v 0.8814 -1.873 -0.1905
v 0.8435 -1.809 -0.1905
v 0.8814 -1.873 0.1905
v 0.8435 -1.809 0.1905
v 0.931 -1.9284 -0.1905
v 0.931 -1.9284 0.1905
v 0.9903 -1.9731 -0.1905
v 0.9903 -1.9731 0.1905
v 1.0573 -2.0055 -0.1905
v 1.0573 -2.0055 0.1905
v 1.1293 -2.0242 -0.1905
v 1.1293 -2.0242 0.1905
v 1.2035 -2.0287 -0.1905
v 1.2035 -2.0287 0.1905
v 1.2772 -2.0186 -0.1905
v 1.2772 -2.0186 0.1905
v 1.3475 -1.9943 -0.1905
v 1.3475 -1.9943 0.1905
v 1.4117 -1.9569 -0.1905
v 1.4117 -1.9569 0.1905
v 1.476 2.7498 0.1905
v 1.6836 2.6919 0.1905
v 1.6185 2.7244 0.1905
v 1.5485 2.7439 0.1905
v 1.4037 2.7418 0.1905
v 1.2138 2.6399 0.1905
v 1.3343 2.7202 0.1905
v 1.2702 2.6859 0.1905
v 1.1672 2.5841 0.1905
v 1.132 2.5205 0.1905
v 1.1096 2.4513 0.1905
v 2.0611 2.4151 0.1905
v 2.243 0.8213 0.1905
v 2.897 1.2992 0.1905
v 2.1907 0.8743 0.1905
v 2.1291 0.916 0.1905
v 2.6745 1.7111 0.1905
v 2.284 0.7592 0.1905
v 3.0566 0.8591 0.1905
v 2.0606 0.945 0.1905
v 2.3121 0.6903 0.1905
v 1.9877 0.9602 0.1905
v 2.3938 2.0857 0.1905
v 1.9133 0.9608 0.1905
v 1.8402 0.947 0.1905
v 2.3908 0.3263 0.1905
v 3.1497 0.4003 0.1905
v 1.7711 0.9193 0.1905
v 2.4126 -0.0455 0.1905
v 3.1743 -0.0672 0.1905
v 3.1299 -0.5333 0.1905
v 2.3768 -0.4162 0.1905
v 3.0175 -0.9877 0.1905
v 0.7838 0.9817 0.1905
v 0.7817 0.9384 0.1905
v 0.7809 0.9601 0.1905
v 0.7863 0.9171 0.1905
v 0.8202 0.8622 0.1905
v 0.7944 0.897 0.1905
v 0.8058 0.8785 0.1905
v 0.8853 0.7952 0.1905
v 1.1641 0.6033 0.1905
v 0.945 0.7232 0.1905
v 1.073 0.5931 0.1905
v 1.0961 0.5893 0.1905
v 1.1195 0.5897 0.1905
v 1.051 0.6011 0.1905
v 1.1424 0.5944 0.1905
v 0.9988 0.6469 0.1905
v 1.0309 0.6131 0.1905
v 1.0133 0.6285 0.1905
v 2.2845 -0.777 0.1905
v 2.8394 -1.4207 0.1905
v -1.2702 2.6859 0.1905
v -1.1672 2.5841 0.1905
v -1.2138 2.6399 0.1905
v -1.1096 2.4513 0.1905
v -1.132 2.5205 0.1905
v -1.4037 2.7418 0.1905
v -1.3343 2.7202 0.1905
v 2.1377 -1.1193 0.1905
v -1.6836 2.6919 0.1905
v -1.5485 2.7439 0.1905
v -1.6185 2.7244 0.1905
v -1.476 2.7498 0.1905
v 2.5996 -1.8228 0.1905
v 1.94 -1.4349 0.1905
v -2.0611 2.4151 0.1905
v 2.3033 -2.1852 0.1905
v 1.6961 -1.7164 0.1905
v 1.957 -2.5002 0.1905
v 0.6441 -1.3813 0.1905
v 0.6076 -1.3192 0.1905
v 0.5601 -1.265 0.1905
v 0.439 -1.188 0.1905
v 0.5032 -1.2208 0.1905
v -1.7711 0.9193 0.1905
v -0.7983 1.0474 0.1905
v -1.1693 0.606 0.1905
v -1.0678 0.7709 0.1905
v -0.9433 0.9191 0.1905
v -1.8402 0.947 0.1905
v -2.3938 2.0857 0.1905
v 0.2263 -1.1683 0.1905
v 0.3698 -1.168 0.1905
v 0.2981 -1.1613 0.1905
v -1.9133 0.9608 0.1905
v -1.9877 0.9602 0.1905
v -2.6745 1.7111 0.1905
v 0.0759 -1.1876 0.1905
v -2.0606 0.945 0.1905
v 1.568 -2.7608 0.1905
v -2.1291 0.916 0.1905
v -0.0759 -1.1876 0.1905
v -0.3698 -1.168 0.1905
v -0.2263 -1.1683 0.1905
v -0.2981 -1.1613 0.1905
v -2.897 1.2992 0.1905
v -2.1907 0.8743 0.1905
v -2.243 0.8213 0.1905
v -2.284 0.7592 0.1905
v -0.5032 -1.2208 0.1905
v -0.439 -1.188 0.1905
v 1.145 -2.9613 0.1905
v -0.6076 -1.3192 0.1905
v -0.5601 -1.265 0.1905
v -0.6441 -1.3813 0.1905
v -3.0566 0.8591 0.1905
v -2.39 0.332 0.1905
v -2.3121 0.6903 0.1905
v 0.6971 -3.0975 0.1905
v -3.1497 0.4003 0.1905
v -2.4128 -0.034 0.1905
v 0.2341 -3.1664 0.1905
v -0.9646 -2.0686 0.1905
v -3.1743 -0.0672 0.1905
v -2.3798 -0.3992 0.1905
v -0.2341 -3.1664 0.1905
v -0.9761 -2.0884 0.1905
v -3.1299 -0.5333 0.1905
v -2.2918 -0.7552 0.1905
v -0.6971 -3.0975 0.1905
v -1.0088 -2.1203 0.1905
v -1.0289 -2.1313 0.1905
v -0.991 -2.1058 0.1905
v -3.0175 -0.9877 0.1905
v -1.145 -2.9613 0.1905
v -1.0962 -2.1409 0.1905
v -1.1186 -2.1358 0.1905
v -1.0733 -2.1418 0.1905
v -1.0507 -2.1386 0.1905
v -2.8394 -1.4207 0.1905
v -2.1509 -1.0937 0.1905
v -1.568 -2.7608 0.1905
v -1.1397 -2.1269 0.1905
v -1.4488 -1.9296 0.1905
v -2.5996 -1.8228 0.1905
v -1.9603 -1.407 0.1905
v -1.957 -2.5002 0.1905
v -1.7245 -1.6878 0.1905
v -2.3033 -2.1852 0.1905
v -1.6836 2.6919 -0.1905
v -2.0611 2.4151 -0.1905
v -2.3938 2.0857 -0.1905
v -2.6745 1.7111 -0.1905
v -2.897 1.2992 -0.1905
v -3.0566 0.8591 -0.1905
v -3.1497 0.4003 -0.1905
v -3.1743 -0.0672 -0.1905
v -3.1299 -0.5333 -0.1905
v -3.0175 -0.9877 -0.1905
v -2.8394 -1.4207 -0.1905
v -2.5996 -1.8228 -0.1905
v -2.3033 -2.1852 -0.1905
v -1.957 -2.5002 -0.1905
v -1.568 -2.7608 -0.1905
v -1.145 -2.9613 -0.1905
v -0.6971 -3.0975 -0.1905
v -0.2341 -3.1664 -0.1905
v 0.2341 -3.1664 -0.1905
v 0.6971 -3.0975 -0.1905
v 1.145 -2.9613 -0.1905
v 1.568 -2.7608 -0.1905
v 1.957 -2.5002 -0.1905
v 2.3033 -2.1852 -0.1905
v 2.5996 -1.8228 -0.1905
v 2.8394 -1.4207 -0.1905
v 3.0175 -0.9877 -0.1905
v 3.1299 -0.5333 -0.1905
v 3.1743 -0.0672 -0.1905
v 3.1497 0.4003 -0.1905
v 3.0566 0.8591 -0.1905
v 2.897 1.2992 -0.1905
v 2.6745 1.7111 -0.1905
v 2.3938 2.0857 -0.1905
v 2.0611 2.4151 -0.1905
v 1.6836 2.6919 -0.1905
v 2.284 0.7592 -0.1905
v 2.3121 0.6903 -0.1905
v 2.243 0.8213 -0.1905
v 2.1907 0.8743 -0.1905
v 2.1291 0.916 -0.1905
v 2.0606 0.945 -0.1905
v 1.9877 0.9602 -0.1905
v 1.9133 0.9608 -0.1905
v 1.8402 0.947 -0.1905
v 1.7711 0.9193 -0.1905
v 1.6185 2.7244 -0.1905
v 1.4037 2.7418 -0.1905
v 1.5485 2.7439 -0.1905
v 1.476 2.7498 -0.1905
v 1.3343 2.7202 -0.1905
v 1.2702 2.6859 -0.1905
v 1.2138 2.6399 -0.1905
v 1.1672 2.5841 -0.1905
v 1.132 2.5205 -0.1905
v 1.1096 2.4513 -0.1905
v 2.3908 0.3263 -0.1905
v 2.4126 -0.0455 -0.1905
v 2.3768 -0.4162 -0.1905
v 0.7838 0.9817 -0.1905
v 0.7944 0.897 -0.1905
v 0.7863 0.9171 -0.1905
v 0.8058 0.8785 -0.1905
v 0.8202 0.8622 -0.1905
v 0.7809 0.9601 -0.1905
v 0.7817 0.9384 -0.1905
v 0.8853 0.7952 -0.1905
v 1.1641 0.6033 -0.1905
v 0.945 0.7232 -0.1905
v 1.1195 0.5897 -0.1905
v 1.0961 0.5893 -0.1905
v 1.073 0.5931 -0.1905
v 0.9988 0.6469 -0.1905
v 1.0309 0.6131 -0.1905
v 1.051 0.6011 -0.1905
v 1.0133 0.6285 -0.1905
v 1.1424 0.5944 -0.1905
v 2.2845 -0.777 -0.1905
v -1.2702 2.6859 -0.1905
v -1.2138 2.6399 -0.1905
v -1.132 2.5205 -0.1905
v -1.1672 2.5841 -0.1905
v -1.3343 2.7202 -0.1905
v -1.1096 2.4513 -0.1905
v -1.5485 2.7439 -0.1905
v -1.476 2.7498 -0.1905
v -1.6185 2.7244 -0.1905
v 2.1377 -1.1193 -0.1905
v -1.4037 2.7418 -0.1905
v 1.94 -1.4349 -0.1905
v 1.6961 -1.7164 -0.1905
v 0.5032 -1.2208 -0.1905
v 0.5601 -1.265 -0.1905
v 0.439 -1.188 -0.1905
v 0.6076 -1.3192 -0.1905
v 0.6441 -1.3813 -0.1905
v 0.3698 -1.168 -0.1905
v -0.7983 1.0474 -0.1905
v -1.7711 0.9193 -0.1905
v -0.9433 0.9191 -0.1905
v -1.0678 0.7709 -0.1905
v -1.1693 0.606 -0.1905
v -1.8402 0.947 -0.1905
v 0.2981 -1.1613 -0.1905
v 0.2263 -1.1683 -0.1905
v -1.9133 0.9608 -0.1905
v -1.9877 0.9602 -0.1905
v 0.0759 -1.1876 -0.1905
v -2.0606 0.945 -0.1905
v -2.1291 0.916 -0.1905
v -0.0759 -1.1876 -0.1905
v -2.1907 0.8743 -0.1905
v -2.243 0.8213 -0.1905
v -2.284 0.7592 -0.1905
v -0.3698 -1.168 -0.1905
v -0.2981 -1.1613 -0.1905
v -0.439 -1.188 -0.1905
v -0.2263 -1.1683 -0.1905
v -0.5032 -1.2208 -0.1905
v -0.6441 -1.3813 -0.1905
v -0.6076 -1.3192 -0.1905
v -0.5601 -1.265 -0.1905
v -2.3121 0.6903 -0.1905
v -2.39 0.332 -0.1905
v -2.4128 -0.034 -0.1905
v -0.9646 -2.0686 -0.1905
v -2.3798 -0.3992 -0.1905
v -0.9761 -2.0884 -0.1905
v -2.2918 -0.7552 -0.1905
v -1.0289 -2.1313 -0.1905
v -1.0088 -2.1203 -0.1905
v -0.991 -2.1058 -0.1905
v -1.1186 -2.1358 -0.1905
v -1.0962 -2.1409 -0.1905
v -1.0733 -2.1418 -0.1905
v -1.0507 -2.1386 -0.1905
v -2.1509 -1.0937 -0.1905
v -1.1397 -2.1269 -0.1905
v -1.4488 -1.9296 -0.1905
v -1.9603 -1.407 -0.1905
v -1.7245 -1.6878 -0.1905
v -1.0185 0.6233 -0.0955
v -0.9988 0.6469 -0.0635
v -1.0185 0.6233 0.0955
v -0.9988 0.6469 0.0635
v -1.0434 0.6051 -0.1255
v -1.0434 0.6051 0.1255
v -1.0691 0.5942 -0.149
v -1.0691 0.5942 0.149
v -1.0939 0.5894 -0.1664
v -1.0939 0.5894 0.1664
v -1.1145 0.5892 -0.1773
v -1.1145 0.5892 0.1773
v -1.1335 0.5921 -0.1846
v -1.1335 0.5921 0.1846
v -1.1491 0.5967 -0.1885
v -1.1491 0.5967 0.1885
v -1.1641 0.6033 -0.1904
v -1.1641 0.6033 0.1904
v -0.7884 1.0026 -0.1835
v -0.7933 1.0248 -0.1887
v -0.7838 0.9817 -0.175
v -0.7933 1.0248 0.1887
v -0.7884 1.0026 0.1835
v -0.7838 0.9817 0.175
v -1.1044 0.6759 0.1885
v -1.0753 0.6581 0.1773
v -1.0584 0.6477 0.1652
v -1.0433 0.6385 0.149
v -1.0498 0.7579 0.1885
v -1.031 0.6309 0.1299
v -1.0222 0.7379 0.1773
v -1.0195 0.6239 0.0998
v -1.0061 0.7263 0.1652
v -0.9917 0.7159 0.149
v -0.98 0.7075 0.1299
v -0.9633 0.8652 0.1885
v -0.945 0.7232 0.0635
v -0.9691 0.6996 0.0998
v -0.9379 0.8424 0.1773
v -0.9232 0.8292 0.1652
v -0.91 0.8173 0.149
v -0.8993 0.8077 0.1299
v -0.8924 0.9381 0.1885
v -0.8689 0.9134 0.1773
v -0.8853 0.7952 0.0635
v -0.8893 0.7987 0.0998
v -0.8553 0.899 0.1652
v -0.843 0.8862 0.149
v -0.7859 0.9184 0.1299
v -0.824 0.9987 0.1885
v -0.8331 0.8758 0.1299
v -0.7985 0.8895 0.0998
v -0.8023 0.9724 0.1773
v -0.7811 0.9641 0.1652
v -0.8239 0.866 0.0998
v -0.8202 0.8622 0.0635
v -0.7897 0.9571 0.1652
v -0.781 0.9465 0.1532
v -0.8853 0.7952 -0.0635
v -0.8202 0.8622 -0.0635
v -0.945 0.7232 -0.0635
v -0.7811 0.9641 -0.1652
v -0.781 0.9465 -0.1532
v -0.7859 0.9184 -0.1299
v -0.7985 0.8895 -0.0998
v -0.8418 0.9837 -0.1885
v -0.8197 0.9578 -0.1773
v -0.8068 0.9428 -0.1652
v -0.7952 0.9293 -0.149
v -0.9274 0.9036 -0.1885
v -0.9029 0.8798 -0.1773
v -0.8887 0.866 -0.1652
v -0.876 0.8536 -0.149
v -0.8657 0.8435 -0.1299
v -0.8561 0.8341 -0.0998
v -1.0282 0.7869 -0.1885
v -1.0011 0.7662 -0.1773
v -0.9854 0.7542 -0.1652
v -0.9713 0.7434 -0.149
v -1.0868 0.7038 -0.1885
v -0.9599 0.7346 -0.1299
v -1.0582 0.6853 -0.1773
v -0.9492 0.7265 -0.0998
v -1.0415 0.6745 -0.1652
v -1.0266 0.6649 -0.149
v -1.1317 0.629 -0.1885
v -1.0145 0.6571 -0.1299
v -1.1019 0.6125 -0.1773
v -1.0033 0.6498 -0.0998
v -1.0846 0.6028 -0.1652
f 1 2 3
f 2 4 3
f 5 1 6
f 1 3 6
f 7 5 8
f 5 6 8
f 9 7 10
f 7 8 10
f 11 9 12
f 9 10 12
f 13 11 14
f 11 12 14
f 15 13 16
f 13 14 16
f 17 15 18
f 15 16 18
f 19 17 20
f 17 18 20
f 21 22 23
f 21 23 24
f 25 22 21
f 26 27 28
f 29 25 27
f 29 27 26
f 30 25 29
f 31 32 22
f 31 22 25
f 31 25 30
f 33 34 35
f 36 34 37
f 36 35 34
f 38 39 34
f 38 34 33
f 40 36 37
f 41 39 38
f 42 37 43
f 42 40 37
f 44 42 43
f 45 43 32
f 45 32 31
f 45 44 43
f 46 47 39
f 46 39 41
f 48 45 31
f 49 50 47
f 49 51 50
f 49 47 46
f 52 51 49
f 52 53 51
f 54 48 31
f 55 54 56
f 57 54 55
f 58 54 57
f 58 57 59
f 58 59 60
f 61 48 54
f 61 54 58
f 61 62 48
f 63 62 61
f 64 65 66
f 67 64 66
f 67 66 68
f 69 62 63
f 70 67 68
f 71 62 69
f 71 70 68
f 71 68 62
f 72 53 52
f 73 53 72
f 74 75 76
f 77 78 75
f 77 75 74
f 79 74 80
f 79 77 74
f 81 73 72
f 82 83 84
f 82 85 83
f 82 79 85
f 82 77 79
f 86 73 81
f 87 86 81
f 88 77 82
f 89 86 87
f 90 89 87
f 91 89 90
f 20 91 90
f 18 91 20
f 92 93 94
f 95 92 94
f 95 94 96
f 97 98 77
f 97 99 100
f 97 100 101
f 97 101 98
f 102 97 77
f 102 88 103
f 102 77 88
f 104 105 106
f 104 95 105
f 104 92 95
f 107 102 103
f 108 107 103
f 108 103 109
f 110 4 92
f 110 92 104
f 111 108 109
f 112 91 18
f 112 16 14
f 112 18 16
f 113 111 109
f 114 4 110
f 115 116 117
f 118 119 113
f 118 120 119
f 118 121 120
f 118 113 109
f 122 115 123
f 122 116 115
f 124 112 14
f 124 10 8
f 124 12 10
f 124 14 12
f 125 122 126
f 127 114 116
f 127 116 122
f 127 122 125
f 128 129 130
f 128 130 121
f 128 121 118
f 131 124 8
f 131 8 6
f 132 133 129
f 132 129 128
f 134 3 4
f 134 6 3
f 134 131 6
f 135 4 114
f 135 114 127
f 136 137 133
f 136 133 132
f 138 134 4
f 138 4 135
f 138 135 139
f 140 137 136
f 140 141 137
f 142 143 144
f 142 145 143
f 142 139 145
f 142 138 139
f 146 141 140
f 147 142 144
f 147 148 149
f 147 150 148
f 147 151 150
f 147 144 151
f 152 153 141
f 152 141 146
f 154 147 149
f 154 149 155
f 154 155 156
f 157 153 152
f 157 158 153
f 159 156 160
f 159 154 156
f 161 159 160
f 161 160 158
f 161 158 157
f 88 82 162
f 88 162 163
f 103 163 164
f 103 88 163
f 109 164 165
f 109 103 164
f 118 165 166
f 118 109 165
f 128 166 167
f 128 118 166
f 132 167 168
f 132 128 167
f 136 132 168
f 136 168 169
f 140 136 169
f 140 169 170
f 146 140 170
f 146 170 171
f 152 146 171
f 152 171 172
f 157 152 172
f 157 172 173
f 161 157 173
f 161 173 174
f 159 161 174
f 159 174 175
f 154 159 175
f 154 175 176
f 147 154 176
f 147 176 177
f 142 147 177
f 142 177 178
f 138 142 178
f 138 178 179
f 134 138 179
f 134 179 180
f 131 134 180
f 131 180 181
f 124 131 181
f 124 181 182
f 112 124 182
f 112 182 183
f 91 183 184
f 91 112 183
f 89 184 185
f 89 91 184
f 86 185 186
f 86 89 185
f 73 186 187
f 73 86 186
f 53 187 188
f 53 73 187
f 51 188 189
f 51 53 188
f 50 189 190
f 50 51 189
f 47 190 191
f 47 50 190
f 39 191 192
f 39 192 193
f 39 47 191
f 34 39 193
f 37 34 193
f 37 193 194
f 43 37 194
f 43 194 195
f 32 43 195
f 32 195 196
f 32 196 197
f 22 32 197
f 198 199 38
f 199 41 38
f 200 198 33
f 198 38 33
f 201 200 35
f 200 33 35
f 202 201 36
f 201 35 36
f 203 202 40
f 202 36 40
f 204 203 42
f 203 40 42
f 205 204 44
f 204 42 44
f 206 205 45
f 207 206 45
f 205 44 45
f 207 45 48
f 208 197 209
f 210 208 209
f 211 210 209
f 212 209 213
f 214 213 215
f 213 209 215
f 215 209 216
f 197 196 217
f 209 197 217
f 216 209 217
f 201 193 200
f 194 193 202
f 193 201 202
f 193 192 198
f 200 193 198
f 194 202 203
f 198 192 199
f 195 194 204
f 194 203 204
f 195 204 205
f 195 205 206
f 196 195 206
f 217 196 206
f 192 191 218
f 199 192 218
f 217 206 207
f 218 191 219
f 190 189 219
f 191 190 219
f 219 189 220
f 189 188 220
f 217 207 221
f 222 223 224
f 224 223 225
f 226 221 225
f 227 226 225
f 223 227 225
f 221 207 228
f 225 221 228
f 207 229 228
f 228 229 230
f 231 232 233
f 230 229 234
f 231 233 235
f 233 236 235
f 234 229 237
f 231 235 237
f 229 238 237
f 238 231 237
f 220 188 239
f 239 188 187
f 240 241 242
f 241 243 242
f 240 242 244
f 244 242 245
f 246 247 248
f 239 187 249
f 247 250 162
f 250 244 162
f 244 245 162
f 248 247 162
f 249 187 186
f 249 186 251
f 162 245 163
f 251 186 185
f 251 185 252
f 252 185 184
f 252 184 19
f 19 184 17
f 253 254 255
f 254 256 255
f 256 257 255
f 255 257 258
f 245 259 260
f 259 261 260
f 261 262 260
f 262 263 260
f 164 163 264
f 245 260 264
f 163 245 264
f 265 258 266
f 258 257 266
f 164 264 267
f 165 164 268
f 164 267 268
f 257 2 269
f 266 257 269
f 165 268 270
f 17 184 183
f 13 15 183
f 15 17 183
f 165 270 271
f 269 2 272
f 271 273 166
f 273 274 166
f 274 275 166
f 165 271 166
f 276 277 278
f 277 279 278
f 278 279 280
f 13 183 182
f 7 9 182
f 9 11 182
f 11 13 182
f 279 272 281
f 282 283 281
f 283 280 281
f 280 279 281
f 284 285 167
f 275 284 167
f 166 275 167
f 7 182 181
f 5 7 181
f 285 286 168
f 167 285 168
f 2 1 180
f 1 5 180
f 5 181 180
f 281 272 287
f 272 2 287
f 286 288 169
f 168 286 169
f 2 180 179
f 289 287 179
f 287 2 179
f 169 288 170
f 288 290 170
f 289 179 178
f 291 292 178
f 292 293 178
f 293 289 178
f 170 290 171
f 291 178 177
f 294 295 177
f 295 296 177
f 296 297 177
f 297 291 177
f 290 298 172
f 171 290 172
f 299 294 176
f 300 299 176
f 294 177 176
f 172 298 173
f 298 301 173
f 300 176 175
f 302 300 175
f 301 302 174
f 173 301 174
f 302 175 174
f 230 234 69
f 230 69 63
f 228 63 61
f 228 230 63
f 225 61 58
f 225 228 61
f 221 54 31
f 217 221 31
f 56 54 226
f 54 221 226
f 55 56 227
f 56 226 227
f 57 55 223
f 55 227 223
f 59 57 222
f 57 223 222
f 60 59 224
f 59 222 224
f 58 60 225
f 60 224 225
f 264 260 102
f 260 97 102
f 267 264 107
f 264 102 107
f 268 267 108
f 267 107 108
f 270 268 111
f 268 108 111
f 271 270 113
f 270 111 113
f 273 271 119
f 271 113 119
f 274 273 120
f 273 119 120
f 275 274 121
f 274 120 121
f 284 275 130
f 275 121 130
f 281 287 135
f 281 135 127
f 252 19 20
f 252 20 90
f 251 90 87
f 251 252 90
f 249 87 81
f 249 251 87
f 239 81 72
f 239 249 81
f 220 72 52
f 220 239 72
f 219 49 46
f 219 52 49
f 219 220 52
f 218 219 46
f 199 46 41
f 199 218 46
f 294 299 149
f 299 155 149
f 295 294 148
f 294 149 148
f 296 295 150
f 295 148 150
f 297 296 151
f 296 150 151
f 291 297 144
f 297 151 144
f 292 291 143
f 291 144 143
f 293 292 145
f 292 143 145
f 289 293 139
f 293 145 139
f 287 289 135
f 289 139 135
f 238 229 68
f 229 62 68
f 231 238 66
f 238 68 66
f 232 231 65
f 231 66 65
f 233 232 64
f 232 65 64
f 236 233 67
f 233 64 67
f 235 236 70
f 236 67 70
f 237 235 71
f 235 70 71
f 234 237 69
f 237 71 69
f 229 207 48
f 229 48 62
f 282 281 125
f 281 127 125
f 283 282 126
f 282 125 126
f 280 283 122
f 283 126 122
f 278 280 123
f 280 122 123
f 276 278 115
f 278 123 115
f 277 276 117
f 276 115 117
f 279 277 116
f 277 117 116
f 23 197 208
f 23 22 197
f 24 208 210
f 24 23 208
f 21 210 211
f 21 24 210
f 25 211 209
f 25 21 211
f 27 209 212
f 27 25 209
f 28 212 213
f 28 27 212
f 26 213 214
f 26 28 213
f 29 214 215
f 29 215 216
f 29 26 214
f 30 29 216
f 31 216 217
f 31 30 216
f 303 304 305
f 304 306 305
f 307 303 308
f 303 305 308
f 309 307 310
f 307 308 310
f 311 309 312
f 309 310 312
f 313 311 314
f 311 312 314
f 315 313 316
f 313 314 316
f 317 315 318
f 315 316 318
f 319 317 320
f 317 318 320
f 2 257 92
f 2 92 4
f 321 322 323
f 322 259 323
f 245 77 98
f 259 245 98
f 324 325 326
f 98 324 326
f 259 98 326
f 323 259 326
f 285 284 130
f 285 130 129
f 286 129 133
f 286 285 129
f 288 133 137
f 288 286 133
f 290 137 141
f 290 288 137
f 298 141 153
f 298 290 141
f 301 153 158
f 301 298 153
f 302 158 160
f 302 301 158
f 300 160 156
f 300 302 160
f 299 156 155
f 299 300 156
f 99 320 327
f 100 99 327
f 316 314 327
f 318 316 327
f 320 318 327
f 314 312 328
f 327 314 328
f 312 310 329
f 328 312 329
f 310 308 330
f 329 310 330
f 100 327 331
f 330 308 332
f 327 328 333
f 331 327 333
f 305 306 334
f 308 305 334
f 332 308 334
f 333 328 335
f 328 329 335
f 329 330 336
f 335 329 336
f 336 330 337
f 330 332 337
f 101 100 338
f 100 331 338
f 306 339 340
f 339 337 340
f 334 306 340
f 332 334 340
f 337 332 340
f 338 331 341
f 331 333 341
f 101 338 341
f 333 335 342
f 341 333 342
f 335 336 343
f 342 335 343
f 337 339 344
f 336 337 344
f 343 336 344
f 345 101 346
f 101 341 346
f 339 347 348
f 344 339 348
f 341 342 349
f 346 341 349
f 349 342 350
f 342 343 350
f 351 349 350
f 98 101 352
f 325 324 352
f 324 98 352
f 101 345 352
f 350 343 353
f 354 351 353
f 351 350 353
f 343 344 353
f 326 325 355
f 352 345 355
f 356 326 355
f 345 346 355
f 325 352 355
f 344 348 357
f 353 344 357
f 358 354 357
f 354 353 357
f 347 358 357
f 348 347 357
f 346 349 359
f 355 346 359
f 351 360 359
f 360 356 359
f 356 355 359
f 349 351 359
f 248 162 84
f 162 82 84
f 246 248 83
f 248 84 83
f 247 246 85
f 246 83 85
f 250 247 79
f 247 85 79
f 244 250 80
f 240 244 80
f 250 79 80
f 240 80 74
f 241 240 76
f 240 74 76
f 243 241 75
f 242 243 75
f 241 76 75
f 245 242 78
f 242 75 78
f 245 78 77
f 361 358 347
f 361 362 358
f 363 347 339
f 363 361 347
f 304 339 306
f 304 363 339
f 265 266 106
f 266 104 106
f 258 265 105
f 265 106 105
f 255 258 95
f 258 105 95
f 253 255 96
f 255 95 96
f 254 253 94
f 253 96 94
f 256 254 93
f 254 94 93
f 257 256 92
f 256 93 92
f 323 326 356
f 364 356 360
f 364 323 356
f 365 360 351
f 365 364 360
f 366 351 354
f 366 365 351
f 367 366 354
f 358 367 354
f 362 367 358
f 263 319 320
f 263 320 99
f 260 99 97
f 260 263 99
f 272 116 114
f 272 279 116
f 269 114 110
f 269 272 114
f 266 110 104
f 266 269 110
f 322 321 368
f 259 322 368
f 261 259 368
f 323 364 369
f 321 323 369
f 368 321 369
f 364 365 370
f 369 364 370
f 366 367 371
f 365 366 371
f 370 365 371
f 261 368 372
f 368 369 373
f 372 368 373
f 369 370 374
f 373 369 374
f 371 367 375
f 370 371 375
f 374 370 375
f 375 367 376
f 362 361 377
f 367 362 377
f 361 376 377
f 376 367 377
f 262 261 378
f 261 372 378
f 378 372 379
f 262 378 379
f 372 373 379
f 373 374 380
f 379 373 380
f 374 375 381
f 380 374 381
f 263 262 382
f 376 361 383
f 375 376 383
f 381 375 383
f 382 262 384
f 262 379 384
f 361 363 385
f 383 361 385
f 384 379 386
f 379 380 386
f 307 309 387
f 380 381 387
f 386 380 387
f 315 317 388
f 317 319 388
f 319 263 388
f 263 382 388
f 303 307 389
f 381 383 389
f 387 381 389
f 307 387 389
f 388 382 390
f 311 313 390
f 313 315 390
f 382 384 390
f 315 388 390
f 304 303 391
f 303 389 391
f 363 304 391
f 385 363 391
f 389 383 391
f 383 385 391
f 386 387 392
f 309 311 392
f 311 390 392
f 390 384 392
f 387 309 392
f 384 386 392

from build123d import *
from OCP.BRepFilletAPI import BRepFilletAPI_MakeFillet

# Parameters (mm, degrees)
SKETCH1_R               = 3.175
SKETCH1_R_2             = 1.18999
BOSS_EXTRUDE1_DEPTH     = 0.1905
CUT_EXTRUDE1_DEPTH      = 5.50626353
CUT_EXTRUDE2_DEPTH      = 5.50626353
CUT_EXTRUDE2_DEPTH_BACK = 5.50626353
FILLET1_R1              = 0.127
FILLET1_R2              = 0.381


with BuildPart() as part:
    # Sketch1 → Boss-Extrude1 (new, symmetric)
    with BuildSketch(Plane.XY):
        with Locations(Location((0, 0, 0), (0, 0, 180))):
            Circle(SKETCH1_R)
        with Locations(Location((0, 0, 0), (0, 0, 180))):
            Circle(SKETCH1_R_2, mode=Mode.SUBTRACT)
    extrude(amount=BOSS_EXTRUDE1_DEPTH, both=True)

    # Sketch2 → Cut-Extrude1 (cut, through all)
    with BuildSketch(Plane.XY.offset(0.1905)):
        Polygon((-0.635, 0.3107001), (0.635, 0.3107001), (1.27, 3.175), (-1.27, 3.175), align=None)
    extrude(amount=-CUT_EXTRUDE1_DEPTH, mode=Mode.SUBTRACT)

    # Sketch3 → Cut-Extrude2 (cut, two sides: drawn at the far end of the back side and taken through both)
    with BuildSketch(Plane.XY.offset(0.1905).offset(-CUT_EXTRUDE2_DEPTH_BACK)):
        with BuildLine():
            Line((-1.05664, 0.547346426), (-2.141464207, 1.112070164))
            ThreePointArc((-2.141464207, 1.112070164), (-2.284557926, -0.77676514), (-1.01978636, -2.186916729))
            Line((-1.01978636, -2.186916729), (-0.50292, -1.078493242))
            ThreePointArc((-0.50292, -1.078493242), (-1.12645262, -0.383641362), (-1.05664, 0.547346426))
        make_face()
        with BuildLine():
            Line((0.50292, -1.078493242), (1.01978636, -2.186916729))
            ThreePointArc((1.01978636, -2.186916729), (2.284557926, -0.77676514), (2.141464207, 1.112070164))
            Line((2.141464207, 1.112070164), (1.05664, 0.547346426))
            ThreePointArc((1.05664, 0.547346426), (1.12645262, -0.383641362), (0.50292, -1.078493242))
        make_face()
    extrude(amount=CUT_EXTRUDE2_DEPTH + CUT_EXTRUDE2_DEPTH_BACK, mode=Mode.SUBTRACT)

    # Fillet1: one fillet with a radius per group of edges: ONE call of the kernel's fillet builder (fillet() takes one radius for all edges)
    fillet1_edges_1 = [part.edges().sort_by_distance(p)[0] for p in [
        (-0.929941204, 0.742486065, 0.1905),
        (-0.929941204, 0.742486065, -0.1905),
        (-0.76769373, 0.909242837, 0),
        (0.76769373, 0.909242837, 0),
        (-1.05664, 0.547346426, 0),
        (-1.01978636, -2.186916729, 0),
        (1.05664, 0.547346426, 0),
    ]]
    fillet1_edges_2 = [part.edges().sort_by_distance(p)[0] for p in [
        (1.216302436, 2.932785942, 0),
        (-1.216302436, 2.932785942, 0),
        (-2.141464207, 1.112070164, 0),
        (-0.50292, -1.078493242, 0),
        (1.01978636, -2.186916729, 0),
        (0.50292, -1.078493242, 0),
        (2.141464207, 1.112070164, 0),
    ]]
    fillet1 = BRepFilletAPI_MakeFillet(part.part.solid().wrapped)
    for e in fillet1_edges_1:
        fillet1.Add(FILLET1_R1, e.wrapped)
    for e in fillet1_edges_2:
        fillet1.Add(FILLET1_R2, e.wrapped)
    add(Compound.cast(fillet1.Shape()), mode=Mode.REPLACE)


solid = part.part
